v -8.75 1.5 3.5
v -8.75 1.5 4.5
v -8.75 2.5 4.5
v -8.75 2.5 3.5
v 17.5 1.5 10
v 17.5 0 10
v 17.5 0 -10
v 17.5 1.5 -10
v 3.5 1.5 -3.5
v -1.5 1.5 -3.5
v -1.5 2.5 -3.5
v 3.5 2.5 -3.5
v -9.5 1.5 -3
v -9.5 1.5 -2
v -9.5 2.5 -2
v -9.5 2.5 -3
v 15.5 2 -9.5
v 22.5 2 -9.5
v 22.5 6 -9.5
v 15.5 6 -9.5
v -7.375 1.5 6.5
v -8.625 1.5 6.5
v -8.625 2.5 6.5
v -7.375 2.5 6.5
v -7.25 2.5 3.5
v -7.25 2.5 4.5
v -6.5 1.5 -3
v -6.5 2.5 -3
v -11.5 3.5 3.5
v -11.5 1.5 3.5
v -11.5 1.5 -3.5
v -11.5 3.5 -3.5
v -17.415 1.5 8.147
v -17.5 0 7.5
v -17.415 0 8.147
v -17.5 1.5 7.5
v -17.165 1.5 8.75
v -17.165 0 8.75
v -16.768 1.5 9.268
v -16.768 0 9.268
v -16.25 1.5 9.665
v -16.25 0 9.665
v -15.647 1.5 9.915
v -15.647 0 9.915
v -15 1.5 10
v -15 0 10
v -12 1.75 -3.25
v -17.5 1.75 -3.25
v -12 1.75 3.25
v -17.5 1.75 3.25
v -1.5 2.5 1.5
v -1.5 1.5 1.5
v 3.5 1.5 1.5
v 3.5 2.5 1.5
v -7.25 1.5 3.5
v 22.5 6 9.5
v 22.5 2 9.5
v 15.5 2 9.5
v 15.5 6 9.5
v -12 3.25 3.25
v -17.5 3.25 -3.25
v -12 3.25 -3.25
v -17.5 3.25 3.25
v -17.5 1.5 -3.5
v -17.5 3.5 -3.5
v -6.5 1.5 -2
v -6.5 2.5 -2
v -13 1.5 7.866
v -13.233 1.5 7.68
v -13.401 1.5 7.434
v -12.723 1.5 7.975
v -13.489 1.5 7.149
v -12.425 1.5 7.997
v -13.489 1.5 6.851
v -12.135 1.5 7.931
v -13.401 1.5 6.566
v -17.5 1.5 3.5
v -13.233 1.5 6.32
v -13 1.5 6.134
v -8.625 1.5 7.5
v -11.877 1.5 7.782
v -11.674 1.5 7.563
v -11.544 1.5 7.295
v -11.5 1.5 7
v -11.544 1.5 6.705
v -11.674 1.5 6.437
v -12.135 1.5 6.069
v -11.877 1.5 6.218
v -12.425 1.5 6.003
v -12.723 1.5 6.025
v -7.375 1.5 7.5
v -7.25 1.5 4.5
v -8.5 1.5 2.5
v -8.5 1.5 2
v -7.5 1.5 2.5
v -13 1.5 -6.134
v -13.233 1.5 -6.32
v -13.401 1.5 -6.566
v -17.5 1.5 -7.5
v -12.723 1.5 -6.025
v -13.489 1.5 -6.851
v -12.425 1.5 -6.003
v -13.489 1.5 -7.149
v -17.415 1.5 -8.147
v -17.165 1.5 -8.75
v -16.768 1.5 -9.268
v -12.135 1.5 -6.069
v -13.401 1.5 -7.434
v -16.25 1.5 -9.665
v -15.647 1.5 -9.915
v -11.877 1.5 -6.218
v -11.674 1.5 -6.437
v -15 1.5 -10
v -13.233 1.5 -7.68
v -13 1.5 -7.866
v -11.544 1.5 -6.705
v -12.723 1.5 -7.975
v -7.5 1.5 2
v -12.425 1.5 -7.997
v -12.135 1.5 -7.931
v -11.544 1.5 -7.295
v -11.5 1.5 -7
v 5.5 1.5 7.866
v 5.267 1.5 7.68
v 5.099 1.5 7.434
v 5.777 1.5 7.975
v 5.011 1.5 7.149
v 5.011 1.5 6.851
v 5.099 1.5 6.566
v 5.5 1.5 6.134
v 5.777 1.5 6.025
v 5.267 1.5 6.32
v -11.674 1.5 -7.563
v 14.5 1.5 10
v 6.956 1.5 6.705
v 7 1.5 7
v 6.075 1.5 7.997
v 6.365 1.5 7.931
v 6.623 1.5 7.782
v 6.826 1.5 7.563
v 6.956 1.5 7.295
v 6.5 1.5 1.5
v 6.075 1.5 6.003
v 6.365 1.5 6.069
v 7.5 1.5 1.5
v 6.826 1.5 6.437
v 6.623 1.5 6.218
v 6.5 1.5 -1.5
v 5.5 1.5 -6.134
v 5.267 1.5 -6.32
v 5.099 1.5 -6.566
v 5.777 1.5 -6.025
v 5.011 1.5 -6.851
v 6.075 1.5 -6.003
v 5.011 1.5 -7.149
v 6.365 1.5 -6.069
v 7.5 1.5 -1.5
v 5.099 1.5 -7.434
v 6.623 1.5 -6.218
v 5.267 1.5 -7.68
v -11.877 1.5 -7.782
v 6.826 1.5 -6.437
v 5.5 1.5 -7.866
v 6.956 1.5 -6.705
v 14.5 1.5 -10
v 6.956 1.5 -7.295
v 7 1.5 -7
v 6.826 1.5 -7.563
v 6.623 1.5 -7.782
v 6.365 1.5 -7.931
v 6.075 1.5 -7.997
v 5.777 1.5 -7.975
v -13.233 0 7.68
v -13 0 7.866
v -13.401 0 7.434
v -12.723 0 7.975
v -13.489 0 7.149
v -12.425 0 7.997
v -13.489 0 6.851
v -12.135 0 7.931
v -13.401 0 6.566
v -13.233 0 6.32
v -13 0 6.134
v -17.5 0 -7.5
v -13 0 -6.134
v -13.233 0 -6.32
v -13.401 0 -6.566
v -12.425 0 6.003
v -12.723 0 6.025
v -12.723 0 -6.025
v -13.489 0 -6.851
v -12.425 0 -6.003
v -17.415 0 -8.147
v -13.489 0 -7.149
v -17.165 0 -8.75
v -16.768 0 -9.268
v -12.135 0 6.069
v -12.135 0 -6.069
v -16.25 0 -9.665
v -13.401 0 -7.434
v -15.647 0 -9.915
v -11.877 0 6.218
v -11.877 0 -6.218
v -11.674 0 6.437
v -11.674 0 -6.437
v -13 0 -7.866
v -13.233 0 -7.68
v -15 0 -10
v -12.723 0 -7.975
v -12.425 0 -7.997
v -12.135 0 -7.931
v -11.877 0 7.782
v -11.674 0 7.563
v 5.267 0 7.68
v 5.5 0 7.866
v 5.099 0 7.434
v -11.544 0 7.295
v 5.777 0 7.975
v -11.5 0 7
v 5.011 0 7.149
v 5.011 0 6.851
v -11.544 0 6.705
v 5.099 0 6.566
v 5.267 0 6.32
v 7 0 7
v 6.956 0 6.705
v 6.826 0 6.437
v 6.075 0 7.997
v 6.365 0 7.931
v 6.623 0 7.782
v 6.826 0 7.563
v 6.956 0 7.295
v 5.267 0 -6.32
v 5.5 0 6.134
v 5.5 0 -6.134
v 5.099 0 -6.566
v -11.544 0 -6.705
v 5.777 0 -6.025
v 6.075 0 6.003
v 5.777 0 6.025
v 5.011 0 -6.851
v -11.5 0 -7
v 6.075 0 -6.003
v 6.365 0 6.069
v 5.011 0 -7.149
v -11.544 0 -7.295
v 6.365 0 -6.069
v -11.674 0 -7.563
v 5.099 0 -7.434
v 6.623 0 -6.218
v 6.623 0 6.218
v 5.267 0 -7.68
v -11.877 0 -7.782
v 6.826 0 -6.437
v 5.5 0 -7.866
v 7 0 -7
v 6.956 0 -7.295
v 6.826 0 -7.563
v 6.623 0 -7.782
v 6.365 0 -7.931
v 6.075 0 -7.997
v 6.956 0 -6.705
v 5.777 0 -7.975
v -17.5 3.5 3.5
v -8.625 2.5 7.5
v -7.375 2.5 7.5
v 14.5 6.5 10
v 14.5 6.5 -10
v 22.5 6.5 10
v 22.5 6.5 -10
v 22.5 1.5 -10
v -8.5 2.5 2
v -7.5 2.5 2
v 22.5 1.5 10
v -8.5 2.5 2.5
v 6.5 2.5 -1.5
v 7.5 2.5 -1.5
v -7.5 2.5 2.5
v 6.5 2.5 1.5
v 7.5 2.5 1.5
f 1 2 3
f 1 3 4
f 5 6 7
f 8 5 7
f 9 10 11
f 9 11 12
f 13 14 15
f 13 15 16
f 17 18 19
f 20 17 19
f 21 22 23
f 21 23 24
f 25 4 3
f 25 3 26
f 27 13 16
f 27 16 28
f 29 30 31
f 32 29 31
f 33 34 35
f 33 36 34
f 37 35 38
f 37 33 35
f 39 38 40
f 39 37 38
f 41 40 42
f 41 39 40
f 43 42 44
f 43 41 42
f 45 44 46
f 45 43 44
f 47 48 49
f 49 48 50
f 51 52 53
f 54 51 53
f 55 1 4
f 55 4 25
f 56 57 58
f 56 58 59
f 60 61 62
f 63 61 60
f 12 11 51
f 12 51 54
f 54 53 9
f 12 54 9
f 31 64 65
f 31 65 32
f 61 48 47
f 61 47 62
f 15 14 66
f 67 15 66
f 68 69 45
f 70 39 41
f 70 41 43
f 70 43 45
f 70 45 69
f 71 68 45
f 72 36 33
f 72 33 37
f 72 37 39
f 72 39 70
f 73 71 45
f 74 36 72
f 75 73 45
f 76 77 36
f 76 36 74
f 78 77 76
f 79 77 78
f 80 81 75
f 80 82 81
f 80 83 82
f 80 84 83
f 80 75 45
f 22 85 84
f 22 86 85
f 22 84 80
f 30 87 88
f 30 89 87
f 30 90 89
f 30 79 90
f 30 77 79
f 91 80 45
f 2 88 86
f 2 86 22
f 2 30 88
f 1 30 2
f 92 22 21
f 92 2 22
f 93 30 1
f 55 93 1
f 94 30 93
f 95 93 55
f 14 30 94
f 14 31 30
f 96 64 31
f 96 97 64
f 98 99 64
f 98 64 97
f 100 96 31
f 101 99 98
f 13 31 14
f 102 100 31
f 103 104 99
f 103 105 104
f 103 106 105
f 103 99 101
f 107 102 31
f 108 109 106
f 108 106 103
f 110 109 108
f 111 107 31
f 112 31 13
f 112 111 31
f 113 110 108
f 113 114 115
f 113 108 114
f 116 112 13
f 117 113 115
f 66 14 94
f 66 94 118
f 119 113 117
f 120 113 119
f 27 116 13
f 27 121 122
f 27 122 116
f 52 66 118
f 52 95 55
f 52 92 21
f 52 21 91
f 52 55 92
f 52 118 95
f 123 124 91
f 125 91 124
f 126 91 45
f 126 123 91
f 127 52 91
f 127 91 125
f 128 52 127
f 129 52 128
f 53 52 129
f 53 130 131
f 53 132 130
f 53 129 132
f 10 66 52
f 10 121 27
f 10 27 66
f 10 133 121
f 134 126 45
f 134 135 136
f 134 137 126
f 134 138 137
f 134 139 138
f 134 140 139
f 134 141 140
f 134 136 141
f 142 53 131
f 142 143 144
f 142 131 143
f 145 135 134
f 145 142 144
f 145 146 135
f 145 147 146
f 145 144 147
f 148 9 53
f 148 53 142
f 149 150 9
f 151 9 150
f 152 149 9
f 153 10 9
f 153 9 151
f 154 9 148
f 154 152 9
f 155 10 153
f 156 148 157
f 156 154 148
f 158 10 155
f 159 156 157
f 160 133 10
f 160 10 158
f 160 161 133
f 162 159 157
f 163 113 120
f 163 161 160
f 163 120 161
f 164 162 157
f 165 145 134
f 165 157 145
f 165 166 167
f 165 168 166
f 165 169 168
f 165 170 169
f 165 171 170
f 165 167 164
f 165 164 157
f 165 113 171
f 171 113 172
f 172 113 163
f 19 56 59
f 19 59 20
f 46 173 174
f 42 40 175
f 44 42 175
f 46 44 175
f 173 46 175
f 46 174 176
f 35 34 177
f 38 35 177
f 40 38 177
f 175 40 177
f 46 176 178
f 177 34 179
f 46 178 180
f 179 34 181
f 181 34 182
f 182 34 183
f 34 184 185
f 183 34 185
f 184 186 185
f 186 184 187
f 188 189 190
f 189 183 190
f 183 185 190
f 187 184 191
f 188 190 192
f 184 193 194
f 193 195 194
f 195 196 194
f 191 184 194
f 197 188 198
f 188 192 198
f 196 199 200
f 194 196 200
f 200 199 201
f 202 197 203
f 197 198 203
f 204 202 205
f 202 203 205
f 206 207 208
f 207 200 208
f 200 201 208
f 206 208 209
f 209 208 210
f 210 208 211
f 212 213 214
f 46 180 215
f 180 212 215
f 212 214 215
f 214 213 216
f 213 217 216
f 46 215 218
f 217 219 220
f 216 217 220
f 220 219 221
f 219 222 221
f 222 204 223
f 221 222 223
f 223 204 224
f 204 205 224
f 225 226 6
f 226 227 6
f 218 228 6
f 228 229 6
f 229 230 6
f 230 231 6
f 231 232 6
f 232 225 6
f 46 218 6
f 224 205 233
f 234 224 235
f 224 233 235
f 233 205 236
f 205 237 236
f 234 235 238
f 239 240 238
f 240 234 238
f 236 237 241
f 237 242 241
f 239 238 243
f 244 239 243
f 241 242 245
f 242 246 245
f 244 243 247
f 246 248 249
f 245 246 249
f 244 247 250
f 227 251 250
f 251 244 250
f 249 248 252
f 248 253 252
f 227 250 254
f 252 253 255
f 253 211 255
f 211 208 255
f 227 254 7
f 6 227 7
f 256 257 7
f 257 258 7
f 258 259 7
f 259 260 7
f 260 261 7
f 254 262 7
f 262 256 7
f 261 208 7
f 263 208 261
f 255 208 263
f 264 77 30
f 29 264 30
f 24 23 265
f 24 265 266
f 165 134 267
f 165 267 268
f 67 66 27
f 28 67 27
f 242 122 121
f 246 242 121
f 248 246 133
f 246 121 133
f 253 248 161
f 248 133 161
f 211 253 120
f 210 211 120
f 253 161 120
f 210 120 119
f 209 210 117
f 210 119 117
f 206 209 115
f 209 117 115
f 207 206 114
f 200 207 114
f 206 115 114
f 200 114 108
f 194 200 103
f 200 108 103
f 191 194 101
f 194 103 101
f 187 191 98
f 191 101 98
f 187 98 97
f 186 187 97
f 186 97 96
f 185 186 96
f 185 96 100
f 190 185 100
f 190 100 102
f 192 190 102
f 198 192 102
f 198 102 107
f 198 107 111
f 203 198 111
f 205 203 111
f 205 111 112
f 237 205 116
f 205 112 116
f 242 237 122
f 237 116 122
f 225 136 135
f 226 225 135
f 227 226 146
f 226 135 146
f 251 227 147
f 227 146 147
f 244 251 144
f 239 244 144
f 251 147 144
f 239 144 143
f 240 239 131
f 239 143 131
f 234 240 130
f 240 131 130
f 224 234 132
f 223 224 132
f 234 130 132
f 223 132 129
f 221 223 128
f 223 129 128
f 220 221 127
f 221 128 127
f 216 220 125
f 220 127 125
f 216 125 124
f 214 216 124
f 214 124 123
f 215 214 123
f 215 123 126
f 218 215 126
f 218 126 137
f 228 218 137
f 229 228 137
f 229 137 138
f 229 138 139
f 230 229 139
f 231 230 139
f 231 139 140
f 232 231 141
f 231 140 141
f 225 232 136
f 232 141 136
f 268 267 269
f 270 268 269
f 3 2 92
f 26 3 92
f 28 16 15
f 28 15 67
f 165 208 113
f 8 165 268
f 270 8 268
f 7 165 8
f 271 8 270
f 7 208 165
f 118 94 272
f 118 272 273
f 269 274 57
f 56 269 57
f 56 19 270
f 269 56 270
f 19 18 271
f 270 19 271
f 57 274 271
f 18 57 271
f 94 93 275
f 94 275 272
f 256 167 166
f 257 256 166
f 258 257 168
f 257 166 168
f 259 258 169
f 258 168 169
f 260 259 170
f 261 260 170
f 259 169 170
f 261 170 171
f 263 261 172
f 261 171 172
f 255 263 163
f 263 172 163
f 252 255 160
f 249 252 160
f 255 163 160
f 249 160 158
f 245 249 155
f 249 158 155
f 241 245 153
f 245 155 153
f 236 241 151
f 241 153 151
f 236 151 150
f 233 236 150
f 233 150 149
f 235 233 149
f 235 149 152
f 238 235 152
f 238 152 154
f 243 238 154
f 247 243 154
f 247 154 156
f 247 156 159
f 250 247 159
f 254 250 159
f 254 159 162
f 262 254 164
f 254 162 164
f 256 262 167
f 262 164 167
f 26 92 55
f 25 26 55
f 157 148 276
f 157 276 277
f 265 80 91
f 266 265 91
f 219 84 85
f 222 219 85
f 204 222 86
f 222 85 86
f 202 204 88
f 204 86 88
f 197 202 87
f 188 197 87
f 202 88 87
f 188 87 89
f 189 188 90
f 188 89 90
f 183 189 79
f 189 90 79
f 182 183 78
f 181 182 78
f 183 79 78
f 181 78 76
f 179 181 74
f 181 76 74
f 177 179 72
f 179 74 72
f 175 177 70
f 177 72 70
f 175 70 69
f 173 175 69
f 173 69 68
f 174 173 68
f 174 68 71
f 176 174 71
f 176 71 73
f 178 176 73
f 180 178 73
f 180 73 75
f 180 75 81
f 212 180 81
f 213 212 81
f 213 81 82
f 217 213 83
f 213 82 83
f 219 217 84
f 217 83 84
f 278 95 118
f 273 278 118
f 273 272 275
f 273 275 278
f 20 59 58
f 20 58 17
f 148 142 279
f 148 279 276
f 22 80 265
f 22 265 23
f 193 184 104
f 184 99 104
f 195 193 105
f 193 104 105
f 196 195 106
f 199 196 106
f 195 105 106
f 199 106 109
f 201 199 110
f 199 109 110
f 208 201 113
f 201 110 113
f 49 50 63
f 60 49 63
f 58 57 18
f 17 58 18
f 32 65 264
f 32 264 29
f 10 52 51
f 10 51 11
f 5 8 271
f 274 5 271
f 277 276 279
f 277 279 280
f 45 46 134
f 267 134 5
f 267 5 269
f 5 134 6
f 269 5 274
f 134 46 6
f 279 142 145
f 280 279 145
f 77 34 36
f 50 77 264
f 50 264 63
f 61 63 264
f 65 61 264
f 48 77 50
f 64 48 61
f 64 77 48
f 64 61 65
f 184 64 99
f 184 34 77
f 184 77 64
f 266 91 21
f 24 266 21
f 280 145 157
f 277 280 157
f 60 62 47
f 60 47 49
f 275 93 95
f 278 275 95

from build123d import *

# Parameters (mm, degrees)
SKETCH1_W           = 35
SKETCH1_H           = 20
BOSS_EXTRUDE1_DEPTH = 1.5
FILLET1_R           = 2.5
SKETCH2_R           = 1
CUT_EXTRUDE1_DEPTH  = 1.5
SKETCH3_W           = 6
SKETCH3_H           = 7
BOSS_EXTRUDE2_DEPTH = 2
SKETCH4_W           = 6.5
SKETCH4_H           = 1.5
CUT_EXTRUDE2_DEPTH  = 5.5
SKETCH5_W           = 8
SKETCH5_H           = 20
BOSS_EXTRUDE3_DEPTH = 5
SKETCH6_W           = 19
SKETCH6_H           = 4
CUT_EXTRUDE3_DEPTH  = 7
SKETCH7_W           = 5
SKETCH7_H           = 5
BOSS_EXTRUDE4_DEPTH = 1
SKETCH8_W           = 1.25
SKETCH8_H           = 1
SKETCH8_W_2         = 1.5
SKETCH8_W_3         = 1
SKETCH8_H_2         = 0.5
SKETCH8_W_4         = 3
SKETCH8_H_3         = 3
BOSS_EXTRUDE5_DEPTH = 1


with BuildPart() as part:
    # Sketch1 → Boss-Extrude1 (new body)
    with BuildSketch(Plane(origin=(0, 0, 0), x_dir=(1, 0, 0), z_dir=(0, 1, 0))):
        Rectangle(SKETCH1_W, SKETCH1_H)
    extrude(amount=BOSS_EXTRUDE1_DEPTH)

    # Fillet1
    fillet1_edges = [part.edges().sort_by_distance(p)[0] for p in [
        (-17.5, 0.75, 10),
        (-17.5, 0.75, -10),
    ]]
    fillet(fillet1_edges, radius=FILLET1_R)

    # Sketch2 → Cut-Extrude1 (cut)
    with BuildSketch(Plane(origin=(0, 1.5, 0), x_dir=(1, 0, 0), z_dir=(0, 1, 0))):
        with Locations((-12.5, 7)):
            Circle(SKETCH2_R)
        with Locations((6, 7)):
            Circle(SKETCH2_R)
        with Locations((6, -7)):
            Circle(SKETCH2_R)
        with Locations((-12.5, -7)):
            Circle(SKETCH2_R)
    extrude(amount=-CUT_EXTRUDE1_DEPTH, mode=Mode.SUBTRACT)

    # Sketch3 → Boss-Extrude2 (add)
    with BuildSketch(Plane(origin=(0, 1.5, 0), x_dir=(1, 0, 0), z_dir=(0, 1, 0))):
        with Locations((-14.5, 0)):
            Rectangle(SKETCH3_W, SKETCH3_H)
    extrude(amount=BOSS_EXTRUDE2_DEPTH)

    # Sketch4 → Cut-Extrude2 (cut)
    with BuildSketch(Plane.ZY.offset(17.5)):
        with Locations((0, 2.5)):
            Rectangle(SKETCH4_W, SKETCH4_H)
    extrude(amount=-CUT_EXTRUDE2_DEPTH, mode=Mode.SUBTRACT)

    # Sketch5 → Boss-Extrude3 (add)
    with BuildSketch(Plane(origin=(0, 1.5, 0), x_dir=(1, 0, 0), z_dir=(0, 1, 0))):
        with Locations((18.5, 0)):
            Rectangle(SKETCH5_W, SKETCH5_H)
    extrude(amount=BOSS_EXTRUDE3_DEPTH)

    # Sketch6 → Cut-Extrude3 (cut)
    with BuildSketch(Plane(origin=(22.5, 0, 0), x_dir=(0, 0, -1), z_dir=(1, 0, 0))):
        with Locations((0, 4)):
            Rectangle(SKETCH6_W, SKETCH6_H)
    extrude(amount=-CUT_EXTRUDE3_DEPTH, mode=Mode.SUBTRACT)

    # Sketch7 → Boss-Extrude4 (add)
    with BuildSketch(Plane(origin=(0, 1.5, 0), x_dir=(1, 0, 0), z_dir=(0, 1, 0))):
        with Locations((1, 1)):
            Rectangle(SKETCH7_W, SKETCH7_H)
    extrude(amount=BOSS_EXTRUDE4_DEPTH)

    # Sketch8 → Boss-Extrude5 (add)
    with BuildSketch(Plane(origin=(0, 1.5, 0), x_dir=(1, 0, 0), z_dir=(0, 1, 0))):
        with Locations((-8, -7)):
            Rectangle(SKETCH8_W, SKETCH8_H)
        with Locations((-8, -4)):
            Rectangle(SKETCH8_W_2, SKETCH8_H)
        with Locations((-8, -2.25)):
            Rectangle(SKETCH8_W_3, SKETCH8_H_2)
        with Locations((-8, 2.5)):
            Rectangle(SKETCH8_W_4, SKETCH8_H)
        with Locations((7, 0)):
            Rectangle(SKETCH8_W_3, SKETCH8_H_3)
    extrude(amount=BOSS_EXTRUDE5_DEPTH)


solid = part.part
